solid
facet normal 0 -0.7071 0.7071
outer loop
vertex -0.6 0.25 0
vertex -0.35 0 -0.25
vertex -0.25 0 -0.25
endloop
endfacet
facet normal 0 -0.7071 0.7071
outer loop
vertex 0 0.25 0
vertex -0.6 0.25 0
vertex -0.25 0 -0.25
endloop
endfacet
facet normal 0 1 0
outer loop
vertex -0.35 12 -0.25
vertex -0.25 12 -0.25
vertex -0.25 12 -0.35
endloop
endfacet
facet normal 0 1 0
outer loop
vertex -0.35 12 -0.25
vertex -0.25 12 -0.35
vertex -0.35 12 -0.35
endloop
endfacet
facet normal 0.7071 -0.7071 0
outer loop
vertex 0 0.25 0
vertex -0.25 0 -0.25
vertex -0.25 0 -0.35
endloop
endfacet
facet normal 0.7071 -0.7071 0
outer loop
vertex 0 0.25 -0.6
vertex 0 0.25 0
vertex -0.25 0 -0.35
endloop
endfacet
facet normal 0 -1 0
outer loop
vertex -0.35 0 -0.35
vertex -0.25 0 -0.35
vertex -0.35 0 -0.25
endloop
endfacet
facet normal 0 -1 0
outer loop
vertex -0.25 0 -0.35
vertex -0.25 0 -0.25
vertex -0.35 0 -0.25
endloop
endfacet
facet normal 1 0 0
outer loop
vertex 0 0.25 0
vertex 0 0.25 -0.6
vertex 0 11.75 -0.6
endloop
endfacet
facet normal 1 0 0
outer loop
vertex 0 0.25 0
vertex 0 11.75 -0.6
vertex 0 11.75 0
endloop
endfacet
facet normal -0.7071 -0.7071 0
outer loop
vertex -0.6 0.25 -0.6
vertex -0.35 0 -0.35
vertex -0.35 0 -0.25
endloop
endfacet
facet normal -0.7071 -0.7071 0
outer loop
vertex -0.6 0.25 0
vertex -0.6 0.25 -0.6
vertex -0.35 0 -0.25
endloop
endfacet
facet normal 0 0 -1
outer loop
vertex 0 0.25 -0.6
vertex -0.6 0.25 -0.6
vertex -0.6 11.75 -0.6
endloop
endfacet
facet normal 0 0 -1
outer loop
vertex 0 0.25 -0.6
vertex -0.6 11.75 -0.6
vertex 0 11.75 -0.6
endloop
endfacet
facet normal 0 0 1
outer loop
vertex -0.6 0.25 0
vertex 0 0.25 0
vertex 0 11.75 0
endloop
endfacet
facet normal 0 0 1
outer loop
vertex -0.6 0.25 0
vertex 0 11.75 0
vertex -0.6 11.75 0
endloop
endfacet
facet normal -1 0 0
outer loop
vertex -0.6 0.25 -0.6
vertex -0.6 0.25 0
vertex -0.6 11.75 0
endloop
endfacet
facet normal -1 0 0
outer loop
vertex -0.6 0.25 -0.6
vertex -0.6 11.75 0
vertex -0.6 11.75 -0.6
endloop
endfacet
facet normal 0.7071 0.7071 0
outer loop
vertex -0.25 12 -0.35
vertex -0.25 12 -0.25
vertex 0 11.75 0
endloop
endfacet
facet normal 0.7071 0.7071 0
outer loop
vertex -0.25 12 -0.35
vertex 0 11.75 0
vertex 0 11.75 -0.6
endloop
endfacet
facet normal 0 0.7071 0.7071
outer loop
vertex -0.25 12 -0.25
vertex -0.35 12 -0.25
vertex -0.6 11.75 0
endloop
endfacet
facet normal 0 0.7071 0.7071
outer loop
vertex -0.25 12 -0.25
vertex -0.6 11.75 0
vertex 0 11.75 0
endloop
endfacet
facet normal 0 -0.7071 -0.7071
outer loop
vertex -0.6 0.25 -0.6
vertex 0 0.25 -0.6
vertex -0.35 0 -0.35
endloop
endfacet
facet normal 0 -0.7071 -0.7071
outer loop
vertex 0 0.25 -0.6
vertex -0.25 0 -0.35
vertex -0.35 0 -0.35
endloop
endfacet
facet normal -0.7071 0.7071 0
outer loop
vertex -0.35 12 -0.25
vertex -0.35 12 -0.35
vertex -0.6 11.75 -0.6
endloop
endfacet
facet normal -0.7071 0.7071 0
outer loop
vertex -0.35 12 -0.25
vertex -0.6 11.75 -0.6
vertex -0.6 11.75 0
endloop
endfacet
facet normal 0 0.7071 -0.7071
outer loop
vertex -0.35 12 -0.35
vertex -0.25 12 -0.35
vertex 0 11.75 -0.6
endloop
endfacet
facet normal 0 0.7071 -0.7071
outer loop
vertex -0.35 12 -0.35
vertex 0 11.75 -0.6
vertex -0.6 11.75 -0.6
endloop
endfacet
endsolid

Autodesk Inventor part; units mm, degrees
ref_plane "YZ Plane" through (0, 0, 0) normal (1, 0, 0) x (0, 1, 0)
ref_plane "XZ Plane" through (0, 0, 0) normal (0, 1, 0) x (-1, 0, 0)
ref_plane "XY Plane" through (0, 0, 0) normal (0, 0, 1) x (1, 0, 0)
sketch "Sketch1" plane through (0, 0, 0) normal (0, 1, 0) x (-1, 0, 0)
  line L0 (0, 0) -> (0.6, 0)
  line L1 (0.6, 0) -> (0.6, -0.6)
  line L2 (0.6, -0.6) -> (0, -0.6)
  line L3 (0, -0.6) -> (0, 0)
  dimension "d0" = 0.6
extrude "Extrusion1" add sketch "Sketch1" along normal blind 12
chamfer "Chamfer1" distance 0.25 angle 45 8 edges at (0, 12, -0.3) (-0.3, 12, 0) (-0.6, 12, -0.3) (-0.3, 12, -0.6) (-0.6, 0, -0.3) (-0.3, 0, -0.6) (0, 0, -0.3) (-0.3, 0, 0)
properties part number "Pin"
